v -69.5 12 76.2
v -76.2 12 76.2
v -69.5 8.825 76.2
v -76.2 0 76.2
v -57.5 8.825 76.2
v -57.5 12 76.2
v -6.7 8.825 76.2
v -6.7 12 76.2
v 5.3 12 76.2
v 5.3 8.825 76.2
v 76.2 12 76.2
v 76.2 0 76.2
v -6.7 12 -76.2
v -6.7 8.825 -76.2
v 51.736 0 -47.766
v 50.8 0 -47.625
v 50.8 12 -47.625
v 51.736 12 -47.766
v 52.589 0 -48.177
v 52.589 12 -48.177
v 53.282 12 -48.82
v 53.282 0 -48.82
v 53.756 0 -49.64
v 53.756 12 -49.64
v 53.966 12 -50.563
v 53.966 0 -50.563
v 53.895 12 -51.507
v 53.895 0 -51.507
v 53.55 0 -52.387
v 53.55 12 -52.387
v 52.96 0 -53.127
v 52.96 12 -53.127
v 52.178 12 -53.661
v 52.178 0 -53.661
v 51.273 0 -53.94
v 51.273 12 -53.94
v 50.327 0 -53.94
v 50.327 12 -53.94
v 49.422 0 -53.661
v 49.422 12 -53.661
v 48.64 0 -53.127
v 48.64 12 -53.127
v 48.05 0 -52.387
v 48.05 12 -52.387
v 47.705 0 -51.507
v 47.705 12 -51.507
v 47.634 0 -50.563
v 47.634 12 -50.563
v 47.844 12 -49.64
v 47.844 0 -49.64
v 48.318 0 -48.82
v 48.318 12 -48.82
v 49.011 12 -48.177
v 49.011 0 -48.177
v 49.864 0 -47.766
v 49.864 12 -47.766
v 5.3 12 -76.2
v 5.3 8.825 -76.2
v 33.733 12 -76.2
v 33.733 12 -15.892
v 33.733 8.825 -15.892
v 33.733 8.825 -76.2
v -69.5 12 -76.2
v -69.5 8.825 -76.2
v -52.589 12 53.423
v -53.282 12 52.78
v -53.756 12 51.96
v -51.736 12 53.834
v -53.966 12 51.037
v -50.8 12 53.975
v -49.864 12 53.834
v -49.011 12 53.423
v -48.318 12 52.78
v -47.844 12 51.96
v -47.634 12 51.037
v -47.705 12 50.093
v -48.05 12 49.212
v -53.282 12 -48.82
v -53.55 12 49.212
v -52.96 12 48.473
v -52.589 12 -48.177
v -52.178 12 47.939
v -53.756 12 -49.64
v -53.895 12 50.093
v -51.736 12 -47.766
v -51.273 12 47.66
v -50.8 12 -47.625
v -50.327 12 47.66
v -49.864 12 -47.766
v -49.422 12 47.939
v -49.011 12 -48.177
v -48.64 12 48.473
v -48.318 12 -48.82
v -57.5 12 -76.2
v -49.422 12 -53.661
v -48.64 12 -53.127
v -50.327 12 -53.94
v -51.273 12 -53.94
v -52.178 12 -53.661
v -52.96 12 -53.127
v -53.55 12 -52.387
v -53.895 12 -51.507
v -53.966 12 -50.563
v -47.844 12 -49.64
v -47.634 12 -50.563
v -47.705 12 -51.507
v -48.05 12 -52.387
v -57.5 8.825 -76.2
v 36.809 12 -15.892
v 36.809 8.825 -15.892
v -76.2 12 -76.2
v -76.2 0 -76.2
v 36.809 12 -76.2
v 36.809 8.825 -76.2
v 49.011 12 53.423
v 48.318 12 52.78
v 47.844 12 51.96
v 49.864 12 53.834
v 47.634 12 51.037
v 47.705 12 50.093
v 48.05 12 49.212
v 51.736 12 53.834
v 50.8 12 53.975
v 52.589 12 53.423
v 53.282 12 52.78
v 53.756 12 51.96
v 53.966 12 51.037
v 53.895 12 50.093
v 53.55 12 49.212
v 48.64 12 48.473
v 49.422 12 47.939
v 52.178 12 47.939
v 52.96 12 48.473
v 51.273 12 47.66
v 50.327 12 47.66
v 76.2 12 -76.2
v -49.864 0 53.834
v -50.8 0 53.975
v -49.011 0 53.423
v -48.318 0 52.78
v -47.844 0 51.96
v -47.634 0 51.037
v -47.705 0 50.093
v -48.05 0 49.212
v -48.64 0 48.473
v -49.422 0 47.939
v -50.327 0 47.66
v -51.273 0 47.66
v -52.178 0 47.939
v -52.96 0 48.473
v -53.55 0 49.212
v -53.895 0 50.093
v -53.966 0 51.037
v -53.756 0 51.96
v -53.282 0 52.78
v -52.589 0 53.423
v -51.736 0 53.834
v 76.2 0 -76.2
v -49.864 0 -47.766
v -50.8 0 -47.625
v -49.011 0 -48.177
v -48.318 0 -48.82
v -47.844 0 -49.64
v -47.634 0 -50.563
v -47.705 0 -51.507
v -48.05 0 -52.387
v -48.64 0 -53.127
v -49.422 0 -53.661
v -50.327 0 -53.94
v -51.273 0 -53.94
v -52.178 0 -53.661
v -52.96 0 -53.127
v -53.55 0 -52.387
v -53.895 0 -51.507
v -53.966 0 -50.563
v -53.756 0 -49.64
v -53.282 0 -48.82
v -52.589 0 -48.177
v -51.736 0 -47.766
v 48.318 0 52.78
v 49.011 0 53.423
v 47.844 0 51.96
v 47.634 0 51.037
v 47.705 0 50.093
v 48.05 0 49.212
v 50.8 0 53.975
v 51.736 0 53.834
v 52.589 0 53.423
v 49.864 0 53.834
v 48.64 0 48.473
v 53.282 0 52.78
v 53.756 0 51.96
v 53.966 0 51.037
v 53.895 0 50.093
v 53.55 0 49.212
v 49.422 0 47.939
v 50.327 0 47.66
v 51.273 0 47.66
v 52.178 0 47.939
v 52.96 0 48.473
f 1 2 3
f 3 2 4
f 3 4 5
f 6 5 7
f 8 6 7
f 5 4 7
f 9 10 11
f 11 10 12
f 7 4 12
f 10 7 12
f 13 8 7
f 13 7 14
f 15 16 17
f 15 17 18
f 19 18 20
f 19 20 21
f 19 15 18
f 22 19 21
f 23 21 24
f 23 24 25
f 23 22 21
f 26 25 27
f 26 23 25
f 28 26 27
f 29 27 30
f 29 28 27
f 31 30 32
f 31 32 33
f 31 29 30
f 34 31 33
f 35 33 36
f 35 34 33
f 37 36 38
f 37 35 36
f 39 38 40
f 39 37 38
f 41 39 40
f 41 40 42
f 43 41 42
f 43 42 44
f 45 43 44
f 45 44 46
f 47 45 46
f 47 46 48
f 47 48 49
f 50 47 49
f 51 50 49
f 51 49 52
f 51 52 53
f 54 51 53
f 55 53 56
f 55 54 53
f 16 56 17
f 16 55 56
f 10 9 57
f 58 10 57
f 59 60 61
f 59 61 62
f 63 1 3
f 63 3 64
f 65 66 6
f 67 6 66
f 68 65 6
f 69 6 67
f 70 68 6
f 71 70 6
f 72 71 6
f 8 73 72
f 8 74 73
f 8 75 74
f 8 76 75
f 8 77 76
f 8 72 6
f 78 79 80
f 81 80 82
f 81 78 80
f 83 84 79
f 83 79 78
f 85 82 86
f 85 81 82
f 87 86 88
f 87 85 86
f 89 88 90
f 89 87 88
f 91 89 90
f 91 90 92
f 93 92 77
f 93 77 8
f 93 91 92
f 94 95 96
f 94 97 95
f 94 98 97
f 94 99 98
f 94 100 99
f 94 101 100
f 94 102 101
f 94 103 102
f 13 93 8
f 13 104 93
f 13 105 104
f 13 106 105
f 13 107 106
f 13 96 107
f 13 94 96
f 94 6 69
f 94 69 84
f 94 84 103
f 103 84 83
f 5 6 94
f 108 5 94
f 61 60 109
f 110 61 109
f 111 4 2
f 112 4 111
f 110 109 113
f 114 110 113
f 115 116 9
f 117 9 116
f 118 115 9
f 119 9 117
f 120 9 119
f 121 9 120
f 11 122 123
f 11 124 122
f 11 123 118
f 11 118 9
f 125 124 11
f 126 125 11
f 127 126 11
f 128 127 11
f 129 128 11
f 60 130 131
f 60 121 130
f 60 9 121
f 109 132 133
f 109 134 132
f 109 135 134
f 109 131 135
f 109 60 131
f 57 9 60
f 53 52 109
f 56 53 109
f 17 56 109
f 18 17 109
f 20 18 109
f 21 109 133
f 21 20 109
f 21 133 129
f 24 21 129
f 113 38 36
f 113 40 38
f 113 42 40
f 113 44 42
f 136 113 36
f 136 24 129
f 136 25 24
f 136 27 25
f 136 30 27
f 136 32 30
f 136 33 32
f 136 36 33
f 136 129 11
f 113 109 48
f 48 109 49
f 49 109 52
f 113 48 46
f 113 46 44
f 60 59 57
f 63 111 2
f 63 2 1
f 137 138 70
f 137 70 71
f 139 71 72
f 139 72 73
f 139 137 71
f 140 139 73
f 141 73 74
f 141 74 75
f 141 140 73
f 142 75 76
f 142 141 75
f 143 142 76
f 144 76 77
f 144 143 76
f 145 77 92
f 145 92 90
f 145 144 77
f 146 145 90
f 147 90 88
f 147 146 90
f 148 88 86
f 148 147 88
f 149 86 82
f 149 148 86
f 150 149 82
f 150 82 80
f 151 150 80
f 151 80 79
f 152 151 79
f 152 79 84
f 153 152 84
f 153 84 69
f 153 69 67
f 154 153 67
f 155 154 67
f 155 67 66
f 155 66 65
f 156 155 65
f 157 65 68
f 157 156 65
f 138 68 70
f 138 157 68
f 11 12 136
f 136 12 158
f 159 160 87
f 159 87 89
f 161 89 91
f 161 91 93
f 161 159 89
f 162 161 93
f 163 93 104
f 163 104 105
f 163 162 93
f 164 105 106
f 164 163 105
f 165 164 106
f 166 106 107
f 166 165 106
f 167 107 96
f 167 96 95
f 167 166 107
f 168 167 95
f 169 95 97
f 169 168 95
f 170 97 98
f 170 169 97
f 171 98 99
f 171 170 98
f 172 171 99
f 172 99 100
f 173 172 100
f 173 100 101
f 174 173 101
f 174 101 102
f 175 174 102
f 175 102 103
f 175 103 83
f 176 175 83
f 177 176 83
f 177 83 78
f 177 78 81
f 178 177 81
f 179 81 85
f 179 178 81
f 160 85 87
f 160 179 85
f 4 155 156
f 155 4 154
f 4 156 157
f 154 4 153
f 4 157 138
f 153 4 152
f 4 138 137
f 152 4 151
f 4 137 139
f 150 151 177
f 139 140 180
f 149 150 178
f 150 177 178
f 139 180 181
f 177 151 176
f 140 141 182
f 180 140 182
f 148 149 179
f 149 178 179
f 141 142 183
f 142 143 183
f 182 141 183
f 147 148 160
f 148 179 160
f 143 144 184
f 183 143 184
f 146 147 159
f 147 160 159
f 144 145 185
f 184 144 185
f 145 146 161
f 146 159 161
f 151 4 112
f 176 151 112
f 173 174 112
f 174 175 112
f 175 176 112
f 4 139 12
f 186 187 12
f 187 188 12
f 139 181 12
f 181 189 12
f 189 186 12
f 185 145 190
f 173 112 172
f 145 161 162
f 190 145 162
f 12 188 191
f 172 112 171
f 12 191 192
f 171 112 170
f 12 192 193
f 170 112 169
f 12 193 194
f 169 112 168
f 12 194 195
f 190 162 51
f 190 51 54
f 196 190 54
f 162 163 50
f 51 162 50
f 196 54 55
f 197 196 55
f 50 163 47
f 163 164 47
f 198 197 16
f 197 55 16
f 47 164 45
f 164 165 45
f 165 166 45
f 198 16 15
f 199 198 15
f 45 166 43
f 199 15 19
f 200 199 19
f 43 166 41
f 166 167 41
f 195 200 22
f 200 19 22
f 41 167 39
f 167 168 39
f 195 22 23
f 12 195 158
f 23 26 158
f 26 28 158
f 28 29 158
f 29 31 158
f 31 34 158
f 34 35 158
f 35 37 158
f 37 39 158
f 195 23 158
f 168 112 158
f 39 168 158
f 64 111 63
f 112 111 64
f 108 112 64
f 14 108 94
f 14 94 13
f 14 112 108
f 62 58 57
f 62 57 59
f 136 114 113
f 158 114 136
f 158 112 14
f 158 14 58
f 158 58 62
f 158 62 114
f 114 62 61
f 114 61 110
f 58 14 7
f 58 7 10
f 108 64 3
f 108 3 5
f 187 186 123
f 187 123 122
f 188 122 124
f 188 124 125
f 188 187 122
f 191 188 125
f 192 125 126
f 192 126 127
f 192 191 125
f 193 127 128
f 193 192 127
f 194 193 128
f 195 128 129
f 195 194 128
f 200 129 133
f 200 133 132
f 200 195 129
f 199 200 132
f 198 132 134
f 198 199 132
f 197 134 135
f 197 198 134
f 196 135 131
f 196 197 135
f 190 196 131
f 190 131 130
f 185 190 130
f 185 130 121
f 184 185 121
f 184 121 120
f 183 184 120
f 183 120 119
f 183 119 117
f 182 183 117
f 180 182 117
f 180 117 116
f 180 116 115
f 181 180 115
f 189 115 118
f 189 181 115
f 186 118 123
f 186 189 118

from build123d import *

# Parameters (mm, degrees)
SKETCH1_W           = 152.4
SKETCH1_H           = 152.4
SKETCH1_R           = 3.175
BOSS_EXTRUDE1_DEPTH = 12
SKETCH2_W           = 12.0000014
SKETCH2_H           = 152.4
SKETCH2_W_2         = 3.076317806
SKETCH2_H_2         = 104.082085775
CUT_EXTRUDE1_DEPTH  = 3.175


with BuildPart() as part:
    # Sketch1 → Boss-Extrude1 (new body)
    with BuildSketch(Plane(origin=(0, 0, 0), x_dir=(1, 0, 0), z_dir=(0, 1, 0))):
        Rectangle(SKETCH1_W, SKETCH1_H)
        with Locations(Location((-50.8, 50.8, 0), (0, 0, 270))):
            Circle(SKETCH1_R, mode=Mode.SUBTRACT)
        with Locations(Location((50.8, 50.8, 0), (0, 0, 270))):
            Circle(SKETCH1_R, mode=Mode.SUBTRACT)
        with Locations(Location((-50.8, -50.8, 0), (0, 0, 270))):
            Circle(SKETCH1_R, mode=Mode.SUBTRACT)
        with Locations(Location((50.8, -50.8, 0), (0, 0, 270))):
            Circle(SKETCH1_R, mode=Mode.SUBTRACT)
    extrude(amount=BOSS_EXTRUDE1_DEPTH)

    # Sketch2 → Cut-Extrude1 (cut)
    with BuildSketch(Plane(origin=(0, 12, 0), x_dir=(1, 0, 0), z_dir=(0, 1, 0))):
        with Locations((-63.5, 0)):
            Rectangle(SKETCH2_W, SKETCH2_H)
        with Locations((-0.7000113, 0)):
            Rectangle(SKETCH2_W, SKETCH2_H)
        with Locations((35.270676847, 67.933500252)):
            Rectangle(SKETCH2_W_2, SKETCH2_H_2)
    extrude(amount=-CUT_EXTRUDE1_DEPTH, mode=Mode.SUBTRACT)


solid = part.part
